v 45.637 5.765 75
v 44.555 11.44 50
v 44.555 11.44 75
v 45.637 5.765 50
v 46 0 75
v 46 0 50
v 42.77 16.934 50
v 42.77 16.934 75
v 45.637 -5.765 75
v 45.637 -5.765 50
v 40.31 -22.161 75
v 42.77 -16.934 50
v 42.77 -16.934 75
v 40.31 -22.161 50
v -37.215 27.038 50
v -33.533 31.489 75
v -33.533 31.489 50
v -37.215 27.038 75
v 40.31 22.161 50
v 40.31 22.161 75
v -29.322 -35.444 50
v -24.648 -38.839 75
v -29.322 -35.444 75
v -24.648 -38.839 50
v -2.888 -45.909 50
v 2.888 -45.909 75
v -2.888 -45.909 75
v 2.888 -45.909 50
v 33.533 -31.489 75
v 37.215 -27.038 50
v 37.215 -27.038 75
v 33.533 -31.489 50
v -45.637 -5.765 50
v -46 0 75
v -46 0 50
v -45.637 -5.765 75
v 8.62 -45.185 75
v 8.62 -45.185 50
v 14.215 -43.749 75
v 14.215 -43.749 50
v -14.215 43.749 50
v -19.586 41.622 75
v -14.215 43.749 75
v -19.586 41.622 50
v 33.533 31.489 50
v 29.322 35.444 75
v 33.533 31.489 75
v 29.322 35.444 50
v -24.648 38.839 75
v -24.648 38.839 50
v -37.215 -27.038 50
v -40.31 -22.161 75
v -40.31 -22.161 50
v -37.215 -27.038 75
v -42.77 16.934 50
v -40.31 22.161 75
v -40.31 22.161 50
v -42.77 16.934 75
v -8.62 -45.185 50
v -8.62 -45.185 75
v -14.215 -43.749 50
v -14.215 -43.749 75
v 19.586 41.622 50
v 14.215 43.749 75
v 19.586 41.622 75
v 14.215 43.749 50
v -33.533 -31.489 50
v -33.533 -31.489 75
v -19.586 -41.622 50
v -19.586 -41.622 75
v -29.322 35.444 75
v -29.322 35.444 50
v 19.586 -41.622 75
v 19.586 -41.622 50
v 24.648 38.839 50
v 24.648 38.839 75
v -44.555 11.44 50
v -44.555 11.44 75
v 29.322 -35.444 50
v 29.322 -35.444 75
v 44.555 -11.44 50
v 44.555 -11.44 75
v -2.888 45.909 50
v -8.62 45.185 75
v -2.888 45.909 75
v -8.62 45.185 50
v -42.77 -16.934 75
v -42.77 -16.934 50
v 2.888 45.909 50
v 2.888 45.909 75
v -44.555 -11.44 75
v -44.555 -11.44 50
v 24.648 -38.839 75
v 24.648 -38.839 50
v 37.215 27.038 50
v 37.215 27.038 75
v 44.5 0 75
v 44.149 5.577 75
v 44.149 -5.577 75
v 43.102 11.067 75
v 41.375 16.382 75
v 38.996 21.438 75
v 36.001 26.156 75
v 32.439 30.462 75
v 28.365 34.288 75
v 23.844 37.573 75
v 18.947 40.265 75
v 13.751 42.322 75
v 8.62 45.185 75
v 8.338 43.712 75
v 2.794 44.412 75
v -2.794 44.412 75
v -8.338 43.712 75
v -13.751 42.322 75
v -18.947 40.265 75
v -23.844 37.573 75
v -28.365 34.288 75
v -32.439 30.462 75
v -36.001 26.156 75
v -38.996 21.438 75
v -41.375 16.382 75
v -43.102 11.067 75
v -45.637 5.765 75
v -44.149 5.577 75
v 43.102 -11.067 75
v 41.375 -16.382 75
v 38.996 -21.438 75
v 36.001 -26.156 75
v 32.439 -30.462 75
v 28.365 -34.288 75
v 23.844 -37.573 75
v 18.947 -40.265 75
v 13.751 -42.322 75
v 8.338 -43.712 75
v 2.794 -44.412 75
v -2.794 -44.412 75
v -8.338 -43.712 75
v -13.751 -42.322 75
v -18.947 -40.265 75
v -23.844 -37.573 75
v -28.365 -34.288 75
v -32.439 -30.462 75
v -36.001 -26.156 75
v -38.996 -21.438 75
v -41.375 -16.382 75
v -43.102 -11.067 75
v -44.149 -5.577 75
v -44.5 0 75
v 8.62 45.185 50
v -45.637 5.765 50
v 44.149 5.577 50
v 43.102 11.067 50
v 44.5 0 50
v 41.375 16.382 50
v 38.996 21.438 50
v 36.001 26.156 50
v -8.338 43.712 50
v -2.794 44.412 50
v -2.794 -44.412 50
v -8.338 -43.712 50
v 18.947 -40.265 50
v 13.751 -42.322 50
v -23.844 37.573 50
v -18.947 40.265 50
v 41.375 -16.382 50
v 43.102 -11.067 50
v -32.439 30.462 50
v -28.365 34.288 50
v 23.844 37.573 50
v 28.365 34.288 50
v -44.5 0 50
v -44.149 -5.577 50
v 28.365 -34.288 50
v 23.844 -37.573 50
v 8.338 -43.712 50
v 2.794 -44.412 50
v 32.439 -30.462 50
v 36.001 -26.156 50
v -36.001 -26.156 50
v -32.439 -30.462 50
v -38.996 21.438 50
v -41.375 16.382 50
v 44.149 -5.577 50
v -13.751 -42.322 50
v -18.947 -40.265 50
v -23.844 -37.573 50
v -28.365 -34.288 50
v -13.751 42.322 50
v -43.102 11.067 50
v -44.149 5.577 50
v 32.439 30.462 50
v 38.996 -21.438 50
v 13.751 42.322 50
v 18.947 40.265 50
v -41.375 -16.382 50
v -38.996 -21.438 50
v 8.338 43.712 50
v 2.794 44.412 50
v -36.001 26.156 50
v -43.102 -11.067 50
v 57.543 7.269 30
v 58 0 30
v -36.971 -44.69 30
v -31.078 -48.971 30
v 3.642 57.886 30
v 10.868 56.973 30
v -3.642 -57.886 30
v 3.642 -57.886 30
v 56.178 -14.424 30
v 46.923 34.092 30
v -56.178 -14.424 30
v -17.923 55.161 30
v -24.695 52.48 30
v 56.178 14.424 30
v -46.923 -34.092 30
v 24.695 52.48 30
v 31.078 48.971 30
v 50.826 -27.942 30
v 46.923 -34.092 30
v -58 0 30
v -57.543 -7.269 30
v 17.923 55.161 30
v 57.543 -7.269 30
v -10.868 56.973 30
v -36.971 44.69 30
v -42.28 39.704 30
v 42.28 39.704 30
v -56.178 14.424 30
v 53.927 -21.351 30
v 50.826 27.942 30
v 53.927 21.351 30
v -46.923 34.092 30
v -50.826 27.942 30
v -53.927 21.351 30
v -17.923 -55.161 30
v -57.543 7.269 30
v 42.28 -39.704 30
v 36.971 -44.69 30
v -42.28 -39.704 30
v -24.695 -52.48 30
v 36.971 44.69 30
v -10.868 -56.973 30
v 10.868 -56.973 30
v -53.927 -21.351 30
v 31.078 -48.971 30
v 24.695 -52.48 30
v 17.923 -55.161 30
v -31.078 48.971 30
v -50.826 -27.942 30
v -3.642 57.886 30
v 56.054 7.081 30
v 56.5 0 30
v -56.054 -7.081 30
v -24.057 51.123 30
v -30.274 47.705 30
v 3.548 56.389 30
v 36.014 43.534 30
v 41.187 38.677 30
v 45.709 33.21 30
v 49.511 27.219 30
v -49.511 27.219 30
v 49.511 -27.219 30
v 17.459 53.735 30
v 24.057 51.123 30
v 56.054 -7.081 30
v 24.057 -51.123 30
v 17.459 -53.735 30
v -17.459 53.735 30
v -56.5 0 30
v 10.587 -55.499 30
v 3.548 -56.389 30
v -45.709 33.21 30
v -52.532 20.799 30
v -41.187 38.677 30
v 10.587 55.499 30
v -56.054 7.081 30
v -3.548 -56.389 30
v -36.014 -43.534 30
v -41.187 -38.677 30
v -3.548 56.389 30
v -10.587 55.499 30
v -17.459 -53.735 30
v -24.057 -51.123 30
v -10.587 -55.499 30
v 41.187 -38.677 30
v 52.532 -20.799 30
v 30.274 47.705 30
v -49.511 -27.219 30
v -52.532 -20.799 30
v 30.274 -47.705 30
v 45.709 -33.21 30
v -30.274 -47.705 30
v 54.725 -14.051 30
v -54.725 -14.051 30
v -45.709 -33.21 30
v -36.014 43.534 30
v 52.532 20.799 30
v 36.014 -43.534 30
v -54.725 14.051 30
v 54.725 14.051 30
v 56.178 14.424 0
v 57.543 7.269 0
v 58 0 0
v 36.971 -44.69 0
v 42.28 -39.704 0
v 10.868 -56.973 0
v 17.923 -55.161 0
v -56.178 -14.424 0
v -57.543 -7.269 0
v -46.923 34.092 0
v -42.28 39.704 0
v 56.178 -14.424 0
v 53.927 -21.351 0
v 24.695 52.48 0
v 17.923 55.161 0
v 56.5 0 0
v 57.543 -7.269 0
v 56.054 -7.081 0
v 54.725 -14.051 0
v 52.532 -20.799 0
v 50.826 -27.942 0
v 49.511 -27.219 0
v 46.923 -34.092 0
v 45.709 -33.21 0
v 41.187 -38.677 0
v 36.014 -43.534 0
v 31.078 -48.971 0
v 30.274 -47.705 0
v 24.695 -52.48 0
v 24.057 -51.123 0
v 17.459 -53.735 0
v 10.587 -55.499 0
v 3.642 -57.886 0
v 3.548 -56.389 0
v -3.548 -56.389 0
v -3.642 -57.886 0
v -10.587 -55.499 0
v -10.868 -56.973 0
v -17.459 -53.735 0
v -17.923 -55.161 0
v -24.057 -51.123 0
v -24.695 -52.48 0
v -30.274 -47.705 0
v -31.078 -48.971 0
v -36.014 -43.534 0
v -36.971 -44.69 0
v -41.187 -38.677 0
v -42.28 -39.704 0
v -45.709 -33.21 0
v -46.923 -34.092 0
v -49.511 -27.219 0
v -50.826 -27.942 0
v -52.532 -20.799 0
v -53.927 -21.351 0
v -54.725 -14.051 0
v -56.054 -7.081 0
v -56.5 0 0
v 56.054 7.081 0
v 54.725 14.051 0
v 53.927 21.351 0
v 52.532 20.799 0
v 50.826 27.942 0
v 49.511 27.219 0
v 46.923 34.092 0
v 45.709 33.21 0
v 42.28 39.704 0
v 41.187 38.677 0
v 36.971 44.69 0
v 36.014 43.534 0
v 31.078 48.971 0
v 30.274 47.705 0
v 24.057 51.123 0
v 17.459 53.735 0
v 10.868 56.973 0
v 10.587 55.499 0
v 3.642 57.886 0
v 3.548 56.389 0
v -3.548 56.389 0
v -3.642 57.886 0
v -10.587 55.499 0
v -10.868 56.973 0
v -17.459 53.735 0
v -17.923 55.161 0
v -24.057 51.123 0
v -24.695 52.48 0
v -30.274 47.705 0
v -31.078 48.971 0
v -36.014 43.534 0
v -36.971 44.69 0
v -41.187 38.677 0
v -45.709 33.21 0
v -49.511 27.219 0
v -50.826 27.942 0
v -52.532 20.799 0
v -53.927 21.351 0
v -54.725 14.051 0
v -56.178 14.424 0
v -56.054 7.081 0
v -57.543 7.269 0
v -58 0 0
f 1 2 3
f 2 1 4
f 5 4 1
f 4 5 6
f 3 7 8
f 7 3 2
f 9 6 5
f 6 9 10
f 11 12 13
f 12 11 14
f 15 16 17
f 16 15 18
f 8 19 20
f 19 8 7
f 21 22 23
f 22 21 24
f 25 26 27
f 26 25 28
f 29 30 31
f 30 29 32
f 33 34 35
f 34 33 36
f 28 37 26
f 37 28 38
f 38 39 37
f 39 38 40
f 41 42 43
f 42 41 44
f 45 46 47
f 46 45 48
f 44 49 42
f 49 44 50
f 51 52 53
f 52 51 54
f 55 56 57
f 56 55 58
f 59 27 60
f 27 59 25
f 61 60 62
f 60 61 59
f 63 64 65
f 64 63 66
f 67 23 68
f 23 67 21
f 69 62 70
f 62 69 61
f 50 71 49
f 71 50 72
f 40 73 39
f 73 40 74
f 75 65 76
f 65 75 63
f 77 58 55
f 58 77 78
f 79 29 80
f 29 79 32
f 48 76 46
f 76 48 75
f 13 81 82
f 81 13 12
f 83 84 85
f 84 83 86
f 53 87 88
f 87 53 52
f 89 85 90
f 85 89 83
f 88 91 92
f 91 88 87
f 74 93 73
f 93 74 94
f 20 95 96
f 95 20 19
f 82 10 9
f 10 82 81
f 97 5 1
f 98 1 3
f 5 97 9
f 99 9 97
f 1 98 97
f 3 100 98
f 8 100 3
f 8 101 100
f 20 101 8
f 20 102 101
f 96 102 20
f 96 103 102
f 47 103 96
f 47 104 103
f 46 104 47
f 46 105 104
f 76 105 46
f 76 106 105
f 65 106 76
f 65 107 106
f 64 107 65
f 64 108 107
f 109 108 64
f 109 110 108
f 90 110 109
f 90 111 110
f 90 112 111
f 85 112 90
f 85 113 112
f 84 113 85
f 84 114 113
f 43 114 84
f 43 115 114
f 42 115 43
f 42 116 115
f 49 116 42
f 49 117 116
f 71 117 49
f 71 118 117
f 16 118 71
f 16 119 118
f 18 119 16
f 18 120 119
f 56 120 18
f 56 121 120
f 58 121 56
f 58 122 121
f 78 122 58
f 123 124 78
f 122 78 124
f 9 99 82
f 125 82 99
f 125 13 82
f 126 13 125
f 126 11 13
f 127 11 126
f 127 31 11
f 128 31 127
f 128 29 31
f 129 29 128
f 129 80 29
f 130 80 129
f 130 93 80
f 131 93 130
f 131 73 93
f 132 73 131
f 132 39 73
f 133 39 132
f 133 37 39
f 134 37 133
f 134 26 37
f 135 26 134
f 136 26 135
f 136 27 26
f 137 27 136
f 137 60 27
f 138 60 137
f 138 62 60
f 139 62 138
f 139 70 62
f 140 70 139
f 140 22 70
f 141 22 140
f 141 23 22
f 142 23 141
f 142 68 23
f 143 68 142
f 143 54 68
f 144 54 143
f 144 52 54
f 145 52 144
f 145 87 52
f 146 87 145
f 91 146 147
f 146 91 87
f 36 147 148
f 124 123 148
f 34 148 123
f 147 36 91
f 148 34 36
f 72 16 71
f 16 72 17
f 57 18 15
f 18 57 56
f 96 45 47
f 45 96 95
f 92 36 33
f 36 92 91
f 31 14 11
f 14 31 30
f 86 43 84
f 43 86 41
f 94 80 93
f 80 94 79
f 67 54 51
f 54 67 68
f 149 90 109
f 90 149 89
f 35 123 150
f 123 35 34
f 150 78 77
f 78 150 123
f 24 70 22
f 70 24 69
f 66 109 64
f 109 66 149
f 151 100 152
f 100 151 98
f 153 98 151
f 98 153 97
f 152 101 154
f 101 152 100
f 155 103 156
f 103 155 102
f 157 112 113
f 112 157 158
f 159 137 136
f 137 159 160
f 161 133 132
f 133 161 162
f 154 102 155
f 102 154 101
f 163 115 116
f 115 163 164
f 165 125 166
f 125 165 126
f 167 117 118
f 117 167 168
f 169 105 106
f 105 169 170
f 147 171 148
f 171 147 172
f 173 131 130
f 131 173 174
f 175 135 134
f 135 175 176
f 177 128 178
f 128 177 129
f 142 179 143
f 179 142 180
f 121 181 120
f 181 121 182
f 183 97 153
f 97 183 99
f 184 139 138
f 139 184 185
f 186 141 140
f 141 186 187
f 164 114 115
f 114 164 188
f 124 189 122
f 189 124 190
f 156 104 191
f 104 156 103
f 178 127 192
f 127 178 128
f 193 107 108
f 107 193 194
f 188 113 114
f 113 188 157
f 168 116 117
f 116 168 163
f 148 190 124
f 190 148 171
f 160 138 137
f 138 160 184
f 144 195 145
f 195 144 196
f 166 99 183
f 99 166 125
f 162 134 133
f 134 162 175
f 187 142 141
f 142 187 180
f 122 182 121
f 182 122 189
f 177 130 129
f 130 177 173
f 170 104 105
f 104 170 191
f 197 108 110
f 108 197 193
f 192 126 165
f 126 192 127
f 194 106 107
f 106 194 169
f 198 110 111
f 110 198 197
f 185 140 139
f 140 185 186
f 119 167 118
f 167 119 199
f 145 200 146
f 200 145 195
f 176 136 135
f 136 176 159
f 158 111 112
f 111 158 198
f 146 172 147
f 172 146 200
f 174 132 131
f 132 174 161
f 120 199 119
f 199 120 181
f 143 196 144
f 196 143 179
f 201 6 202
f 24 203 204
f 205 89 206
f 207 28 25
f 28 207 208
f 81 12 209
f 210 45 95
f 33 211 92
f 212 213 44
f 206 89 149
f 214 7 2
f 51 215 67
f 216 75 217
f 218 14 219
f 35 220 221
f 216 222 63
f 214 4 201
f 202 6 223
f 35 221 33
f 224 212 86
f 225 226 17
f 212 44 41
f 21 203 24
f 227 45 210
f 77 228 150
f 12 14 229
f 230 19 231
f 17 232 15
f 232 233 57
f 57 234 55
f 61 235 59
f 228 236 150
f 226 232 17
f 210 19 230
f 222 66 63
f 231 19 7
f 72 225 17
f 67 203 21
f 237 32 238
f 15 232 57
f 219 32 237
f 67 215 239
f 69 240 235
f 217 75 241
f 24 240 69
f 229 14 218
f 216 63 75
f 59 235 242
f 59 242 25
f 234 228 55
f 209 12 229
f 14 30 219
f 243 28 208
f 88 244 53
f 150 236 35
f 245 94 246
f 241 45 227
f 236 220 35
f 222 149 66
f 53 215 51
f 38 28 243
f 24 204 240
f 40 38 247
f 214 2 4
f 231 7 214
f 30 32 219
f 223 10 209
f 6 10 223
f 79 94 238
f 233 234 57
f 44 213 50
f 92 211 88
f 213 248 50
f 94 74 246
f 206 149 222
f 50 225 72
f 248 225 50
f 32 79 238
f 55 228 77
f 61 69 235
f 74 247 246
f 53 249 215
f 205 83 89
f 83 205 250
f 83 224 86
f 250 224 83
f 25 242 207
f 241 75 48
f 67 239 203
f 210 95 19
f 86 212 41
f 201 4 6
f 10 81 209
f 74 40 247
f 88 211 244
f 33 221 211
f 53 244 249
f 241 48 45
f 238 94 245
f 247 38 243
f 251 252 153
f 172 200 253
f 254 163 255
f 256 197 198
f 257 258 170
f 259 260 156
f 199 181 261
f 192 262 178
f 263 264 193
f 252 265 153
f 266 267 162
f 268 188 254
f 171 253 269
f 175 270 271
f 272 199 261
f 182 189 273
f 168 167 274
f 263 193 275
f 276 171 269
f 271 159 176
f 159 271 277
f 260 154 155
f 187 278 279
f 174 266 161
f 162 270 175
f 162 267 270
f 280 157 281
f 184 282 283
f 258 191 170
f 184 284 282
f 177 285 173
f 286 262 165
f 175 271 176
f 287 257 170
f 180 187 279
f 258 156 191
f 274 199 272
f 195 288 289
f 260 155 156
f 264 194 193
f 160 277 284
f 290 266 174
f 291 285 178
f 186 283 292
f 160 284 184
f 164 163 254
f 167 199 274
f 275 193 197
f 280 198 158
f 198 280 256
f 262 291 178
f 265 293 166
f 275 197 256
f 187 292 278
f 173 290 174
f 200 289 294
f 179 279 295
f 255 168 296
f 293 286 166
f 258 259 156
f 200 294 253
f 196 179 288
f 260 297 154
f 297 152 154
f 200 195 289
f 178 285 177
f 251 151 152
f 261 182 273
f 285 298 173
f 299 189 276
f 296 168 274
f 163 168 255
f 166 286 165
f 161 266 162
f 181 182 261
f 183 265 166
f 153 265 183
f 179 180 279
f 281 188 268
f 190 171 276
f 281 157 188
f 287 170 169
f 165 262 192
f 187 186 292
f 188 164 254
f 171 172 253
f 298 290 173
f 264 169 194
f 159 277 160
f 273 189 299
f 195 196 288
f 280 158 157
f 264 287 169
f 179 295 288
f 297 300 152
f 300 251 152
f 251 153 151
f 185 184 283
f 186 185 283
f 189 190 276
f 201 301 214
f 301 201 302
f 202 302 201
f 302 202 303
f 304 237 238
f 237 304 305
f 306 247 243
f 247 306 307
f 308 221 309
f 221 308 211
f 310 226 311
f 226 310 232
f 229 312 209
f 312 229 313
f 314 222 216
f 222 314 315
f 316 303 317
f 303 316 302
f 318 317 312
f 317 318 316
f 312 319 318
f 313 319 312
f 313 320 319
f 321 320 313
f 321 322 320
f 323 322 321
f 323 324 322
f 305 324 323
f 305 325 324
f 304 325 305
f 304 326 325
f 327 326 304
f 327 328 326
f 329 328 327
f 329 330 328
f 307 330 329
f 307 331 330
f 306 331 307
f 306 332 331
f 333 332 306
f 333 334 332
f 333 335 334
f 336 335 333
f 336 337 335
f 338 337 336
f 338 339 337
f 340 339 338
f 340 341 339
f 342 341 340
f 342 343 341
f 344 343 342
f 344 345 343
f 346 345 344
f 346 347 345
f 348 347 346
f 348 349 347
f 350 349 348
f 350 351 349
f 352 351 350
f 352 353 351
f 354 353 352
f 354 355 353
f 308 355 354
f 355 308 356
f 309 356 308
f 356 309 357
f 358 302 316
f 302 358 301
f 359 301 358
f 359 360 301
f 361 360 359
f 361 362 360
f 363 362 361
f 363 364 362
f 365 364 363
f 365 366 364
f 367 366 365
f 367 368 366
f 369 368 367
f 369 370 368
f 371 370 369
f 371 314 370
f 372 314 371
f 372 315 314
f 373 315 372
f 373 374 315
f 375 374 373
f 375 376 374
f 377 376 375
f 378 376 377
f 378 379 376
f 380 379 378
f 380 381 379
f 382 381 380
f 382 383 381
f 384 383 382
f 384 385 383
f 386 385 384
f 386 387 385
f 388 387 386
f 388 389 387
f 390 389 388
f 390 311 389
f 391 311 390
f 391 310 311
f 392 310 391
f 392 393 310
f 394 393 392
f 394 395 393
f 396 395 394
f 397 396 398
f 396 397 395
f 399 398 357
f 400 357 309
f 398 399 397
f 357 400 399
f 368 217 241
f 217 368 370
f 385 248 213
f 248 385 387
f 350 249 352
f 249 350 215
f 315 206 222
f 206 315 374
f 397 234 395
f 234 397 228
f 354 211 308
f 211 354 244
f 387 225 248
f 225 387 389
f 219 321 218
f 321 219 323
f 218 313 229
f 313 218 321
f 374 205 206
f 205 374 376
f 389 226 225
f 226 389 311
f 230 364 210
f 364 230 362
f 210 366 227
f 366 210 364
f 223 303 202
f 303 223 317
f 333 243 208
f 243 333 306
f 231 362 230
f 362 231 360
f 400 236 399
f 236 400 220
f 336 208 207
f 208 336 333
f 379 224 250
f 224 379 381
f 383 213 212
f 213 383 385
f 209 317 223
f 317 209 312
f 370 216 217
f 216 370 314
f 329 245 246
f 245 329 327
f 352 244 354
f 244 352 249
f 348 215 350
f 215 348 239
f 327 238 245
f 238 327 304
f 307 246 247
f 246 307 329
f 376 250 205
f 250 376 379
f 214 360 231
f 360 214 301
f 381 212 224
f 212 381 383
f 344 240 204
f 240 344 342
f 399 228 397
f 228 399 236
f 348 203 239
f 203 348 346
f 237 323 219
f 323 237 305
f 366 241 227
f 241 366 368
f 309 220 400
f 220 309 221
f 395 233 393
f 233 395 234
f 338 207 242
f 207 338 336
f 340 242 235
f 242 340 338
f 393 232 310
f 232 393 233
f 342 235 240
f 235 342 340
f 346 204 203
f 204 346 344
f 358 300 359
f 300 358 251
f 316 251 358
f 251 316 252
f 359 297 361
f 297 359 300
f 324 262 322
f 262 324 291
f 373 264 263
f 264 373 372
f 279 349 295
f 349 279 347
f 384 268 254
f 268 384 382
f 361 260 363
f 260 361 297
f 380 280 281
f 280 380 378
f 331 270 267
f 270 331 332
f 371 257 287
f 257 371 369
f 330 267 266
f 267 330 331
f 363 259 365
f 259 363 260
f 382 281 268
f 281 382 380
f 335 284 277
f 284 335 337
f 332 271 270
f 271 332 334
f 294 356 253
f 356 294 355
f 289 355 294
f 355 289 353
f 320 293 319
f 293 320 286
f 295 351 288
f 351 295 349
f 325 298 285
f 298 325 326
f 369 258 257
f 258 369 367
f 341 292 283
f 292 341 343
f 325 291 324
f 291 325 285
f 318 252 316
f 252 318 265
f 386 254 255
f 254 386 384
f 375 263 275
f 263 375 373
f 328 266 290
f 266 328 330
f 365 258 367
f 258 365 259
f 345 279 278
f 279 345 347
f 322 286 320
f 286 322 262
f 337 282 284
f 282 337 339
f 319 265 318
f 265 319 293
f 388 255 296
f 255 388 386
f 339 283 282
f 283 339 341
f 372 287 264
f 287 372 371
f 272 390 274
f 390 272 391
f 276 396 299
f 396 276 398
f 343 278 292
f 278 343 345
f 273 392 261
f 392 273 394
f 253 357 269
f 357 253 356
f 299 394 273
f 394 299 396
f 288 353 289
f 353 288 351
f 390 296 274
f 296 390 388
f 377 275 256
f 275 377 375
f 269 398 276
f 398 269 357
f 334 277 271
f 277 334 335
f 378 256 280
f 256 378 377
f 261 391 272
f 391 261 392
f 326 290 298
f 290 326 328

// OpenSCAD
d1=92;
d2=113;

wall=3;

h1=25;
ht=20;
h2=30;

$fn=50;

module cylinder1() {
difference() {
  cylinder(d=d1, h=h1);
  cylinder(d=d1-wall, h=h1);
}
  
}

module cylinder2() {
  difference() {
  cylinder(d=d2+wall, h=h2);
  cylinder(d=d2, h=h2);
}  
}

module cylindert() {
      difference() {
  cylinder(d1=d2+wall, d2=d1, h=ht);
  cylinder(d1=d2, d2=d1-wall, h=ht);
}  
}

translate([0,0,h2+ht]) cylinder1();
translate([0,0,h2]) cylindert();
cylinder2();
